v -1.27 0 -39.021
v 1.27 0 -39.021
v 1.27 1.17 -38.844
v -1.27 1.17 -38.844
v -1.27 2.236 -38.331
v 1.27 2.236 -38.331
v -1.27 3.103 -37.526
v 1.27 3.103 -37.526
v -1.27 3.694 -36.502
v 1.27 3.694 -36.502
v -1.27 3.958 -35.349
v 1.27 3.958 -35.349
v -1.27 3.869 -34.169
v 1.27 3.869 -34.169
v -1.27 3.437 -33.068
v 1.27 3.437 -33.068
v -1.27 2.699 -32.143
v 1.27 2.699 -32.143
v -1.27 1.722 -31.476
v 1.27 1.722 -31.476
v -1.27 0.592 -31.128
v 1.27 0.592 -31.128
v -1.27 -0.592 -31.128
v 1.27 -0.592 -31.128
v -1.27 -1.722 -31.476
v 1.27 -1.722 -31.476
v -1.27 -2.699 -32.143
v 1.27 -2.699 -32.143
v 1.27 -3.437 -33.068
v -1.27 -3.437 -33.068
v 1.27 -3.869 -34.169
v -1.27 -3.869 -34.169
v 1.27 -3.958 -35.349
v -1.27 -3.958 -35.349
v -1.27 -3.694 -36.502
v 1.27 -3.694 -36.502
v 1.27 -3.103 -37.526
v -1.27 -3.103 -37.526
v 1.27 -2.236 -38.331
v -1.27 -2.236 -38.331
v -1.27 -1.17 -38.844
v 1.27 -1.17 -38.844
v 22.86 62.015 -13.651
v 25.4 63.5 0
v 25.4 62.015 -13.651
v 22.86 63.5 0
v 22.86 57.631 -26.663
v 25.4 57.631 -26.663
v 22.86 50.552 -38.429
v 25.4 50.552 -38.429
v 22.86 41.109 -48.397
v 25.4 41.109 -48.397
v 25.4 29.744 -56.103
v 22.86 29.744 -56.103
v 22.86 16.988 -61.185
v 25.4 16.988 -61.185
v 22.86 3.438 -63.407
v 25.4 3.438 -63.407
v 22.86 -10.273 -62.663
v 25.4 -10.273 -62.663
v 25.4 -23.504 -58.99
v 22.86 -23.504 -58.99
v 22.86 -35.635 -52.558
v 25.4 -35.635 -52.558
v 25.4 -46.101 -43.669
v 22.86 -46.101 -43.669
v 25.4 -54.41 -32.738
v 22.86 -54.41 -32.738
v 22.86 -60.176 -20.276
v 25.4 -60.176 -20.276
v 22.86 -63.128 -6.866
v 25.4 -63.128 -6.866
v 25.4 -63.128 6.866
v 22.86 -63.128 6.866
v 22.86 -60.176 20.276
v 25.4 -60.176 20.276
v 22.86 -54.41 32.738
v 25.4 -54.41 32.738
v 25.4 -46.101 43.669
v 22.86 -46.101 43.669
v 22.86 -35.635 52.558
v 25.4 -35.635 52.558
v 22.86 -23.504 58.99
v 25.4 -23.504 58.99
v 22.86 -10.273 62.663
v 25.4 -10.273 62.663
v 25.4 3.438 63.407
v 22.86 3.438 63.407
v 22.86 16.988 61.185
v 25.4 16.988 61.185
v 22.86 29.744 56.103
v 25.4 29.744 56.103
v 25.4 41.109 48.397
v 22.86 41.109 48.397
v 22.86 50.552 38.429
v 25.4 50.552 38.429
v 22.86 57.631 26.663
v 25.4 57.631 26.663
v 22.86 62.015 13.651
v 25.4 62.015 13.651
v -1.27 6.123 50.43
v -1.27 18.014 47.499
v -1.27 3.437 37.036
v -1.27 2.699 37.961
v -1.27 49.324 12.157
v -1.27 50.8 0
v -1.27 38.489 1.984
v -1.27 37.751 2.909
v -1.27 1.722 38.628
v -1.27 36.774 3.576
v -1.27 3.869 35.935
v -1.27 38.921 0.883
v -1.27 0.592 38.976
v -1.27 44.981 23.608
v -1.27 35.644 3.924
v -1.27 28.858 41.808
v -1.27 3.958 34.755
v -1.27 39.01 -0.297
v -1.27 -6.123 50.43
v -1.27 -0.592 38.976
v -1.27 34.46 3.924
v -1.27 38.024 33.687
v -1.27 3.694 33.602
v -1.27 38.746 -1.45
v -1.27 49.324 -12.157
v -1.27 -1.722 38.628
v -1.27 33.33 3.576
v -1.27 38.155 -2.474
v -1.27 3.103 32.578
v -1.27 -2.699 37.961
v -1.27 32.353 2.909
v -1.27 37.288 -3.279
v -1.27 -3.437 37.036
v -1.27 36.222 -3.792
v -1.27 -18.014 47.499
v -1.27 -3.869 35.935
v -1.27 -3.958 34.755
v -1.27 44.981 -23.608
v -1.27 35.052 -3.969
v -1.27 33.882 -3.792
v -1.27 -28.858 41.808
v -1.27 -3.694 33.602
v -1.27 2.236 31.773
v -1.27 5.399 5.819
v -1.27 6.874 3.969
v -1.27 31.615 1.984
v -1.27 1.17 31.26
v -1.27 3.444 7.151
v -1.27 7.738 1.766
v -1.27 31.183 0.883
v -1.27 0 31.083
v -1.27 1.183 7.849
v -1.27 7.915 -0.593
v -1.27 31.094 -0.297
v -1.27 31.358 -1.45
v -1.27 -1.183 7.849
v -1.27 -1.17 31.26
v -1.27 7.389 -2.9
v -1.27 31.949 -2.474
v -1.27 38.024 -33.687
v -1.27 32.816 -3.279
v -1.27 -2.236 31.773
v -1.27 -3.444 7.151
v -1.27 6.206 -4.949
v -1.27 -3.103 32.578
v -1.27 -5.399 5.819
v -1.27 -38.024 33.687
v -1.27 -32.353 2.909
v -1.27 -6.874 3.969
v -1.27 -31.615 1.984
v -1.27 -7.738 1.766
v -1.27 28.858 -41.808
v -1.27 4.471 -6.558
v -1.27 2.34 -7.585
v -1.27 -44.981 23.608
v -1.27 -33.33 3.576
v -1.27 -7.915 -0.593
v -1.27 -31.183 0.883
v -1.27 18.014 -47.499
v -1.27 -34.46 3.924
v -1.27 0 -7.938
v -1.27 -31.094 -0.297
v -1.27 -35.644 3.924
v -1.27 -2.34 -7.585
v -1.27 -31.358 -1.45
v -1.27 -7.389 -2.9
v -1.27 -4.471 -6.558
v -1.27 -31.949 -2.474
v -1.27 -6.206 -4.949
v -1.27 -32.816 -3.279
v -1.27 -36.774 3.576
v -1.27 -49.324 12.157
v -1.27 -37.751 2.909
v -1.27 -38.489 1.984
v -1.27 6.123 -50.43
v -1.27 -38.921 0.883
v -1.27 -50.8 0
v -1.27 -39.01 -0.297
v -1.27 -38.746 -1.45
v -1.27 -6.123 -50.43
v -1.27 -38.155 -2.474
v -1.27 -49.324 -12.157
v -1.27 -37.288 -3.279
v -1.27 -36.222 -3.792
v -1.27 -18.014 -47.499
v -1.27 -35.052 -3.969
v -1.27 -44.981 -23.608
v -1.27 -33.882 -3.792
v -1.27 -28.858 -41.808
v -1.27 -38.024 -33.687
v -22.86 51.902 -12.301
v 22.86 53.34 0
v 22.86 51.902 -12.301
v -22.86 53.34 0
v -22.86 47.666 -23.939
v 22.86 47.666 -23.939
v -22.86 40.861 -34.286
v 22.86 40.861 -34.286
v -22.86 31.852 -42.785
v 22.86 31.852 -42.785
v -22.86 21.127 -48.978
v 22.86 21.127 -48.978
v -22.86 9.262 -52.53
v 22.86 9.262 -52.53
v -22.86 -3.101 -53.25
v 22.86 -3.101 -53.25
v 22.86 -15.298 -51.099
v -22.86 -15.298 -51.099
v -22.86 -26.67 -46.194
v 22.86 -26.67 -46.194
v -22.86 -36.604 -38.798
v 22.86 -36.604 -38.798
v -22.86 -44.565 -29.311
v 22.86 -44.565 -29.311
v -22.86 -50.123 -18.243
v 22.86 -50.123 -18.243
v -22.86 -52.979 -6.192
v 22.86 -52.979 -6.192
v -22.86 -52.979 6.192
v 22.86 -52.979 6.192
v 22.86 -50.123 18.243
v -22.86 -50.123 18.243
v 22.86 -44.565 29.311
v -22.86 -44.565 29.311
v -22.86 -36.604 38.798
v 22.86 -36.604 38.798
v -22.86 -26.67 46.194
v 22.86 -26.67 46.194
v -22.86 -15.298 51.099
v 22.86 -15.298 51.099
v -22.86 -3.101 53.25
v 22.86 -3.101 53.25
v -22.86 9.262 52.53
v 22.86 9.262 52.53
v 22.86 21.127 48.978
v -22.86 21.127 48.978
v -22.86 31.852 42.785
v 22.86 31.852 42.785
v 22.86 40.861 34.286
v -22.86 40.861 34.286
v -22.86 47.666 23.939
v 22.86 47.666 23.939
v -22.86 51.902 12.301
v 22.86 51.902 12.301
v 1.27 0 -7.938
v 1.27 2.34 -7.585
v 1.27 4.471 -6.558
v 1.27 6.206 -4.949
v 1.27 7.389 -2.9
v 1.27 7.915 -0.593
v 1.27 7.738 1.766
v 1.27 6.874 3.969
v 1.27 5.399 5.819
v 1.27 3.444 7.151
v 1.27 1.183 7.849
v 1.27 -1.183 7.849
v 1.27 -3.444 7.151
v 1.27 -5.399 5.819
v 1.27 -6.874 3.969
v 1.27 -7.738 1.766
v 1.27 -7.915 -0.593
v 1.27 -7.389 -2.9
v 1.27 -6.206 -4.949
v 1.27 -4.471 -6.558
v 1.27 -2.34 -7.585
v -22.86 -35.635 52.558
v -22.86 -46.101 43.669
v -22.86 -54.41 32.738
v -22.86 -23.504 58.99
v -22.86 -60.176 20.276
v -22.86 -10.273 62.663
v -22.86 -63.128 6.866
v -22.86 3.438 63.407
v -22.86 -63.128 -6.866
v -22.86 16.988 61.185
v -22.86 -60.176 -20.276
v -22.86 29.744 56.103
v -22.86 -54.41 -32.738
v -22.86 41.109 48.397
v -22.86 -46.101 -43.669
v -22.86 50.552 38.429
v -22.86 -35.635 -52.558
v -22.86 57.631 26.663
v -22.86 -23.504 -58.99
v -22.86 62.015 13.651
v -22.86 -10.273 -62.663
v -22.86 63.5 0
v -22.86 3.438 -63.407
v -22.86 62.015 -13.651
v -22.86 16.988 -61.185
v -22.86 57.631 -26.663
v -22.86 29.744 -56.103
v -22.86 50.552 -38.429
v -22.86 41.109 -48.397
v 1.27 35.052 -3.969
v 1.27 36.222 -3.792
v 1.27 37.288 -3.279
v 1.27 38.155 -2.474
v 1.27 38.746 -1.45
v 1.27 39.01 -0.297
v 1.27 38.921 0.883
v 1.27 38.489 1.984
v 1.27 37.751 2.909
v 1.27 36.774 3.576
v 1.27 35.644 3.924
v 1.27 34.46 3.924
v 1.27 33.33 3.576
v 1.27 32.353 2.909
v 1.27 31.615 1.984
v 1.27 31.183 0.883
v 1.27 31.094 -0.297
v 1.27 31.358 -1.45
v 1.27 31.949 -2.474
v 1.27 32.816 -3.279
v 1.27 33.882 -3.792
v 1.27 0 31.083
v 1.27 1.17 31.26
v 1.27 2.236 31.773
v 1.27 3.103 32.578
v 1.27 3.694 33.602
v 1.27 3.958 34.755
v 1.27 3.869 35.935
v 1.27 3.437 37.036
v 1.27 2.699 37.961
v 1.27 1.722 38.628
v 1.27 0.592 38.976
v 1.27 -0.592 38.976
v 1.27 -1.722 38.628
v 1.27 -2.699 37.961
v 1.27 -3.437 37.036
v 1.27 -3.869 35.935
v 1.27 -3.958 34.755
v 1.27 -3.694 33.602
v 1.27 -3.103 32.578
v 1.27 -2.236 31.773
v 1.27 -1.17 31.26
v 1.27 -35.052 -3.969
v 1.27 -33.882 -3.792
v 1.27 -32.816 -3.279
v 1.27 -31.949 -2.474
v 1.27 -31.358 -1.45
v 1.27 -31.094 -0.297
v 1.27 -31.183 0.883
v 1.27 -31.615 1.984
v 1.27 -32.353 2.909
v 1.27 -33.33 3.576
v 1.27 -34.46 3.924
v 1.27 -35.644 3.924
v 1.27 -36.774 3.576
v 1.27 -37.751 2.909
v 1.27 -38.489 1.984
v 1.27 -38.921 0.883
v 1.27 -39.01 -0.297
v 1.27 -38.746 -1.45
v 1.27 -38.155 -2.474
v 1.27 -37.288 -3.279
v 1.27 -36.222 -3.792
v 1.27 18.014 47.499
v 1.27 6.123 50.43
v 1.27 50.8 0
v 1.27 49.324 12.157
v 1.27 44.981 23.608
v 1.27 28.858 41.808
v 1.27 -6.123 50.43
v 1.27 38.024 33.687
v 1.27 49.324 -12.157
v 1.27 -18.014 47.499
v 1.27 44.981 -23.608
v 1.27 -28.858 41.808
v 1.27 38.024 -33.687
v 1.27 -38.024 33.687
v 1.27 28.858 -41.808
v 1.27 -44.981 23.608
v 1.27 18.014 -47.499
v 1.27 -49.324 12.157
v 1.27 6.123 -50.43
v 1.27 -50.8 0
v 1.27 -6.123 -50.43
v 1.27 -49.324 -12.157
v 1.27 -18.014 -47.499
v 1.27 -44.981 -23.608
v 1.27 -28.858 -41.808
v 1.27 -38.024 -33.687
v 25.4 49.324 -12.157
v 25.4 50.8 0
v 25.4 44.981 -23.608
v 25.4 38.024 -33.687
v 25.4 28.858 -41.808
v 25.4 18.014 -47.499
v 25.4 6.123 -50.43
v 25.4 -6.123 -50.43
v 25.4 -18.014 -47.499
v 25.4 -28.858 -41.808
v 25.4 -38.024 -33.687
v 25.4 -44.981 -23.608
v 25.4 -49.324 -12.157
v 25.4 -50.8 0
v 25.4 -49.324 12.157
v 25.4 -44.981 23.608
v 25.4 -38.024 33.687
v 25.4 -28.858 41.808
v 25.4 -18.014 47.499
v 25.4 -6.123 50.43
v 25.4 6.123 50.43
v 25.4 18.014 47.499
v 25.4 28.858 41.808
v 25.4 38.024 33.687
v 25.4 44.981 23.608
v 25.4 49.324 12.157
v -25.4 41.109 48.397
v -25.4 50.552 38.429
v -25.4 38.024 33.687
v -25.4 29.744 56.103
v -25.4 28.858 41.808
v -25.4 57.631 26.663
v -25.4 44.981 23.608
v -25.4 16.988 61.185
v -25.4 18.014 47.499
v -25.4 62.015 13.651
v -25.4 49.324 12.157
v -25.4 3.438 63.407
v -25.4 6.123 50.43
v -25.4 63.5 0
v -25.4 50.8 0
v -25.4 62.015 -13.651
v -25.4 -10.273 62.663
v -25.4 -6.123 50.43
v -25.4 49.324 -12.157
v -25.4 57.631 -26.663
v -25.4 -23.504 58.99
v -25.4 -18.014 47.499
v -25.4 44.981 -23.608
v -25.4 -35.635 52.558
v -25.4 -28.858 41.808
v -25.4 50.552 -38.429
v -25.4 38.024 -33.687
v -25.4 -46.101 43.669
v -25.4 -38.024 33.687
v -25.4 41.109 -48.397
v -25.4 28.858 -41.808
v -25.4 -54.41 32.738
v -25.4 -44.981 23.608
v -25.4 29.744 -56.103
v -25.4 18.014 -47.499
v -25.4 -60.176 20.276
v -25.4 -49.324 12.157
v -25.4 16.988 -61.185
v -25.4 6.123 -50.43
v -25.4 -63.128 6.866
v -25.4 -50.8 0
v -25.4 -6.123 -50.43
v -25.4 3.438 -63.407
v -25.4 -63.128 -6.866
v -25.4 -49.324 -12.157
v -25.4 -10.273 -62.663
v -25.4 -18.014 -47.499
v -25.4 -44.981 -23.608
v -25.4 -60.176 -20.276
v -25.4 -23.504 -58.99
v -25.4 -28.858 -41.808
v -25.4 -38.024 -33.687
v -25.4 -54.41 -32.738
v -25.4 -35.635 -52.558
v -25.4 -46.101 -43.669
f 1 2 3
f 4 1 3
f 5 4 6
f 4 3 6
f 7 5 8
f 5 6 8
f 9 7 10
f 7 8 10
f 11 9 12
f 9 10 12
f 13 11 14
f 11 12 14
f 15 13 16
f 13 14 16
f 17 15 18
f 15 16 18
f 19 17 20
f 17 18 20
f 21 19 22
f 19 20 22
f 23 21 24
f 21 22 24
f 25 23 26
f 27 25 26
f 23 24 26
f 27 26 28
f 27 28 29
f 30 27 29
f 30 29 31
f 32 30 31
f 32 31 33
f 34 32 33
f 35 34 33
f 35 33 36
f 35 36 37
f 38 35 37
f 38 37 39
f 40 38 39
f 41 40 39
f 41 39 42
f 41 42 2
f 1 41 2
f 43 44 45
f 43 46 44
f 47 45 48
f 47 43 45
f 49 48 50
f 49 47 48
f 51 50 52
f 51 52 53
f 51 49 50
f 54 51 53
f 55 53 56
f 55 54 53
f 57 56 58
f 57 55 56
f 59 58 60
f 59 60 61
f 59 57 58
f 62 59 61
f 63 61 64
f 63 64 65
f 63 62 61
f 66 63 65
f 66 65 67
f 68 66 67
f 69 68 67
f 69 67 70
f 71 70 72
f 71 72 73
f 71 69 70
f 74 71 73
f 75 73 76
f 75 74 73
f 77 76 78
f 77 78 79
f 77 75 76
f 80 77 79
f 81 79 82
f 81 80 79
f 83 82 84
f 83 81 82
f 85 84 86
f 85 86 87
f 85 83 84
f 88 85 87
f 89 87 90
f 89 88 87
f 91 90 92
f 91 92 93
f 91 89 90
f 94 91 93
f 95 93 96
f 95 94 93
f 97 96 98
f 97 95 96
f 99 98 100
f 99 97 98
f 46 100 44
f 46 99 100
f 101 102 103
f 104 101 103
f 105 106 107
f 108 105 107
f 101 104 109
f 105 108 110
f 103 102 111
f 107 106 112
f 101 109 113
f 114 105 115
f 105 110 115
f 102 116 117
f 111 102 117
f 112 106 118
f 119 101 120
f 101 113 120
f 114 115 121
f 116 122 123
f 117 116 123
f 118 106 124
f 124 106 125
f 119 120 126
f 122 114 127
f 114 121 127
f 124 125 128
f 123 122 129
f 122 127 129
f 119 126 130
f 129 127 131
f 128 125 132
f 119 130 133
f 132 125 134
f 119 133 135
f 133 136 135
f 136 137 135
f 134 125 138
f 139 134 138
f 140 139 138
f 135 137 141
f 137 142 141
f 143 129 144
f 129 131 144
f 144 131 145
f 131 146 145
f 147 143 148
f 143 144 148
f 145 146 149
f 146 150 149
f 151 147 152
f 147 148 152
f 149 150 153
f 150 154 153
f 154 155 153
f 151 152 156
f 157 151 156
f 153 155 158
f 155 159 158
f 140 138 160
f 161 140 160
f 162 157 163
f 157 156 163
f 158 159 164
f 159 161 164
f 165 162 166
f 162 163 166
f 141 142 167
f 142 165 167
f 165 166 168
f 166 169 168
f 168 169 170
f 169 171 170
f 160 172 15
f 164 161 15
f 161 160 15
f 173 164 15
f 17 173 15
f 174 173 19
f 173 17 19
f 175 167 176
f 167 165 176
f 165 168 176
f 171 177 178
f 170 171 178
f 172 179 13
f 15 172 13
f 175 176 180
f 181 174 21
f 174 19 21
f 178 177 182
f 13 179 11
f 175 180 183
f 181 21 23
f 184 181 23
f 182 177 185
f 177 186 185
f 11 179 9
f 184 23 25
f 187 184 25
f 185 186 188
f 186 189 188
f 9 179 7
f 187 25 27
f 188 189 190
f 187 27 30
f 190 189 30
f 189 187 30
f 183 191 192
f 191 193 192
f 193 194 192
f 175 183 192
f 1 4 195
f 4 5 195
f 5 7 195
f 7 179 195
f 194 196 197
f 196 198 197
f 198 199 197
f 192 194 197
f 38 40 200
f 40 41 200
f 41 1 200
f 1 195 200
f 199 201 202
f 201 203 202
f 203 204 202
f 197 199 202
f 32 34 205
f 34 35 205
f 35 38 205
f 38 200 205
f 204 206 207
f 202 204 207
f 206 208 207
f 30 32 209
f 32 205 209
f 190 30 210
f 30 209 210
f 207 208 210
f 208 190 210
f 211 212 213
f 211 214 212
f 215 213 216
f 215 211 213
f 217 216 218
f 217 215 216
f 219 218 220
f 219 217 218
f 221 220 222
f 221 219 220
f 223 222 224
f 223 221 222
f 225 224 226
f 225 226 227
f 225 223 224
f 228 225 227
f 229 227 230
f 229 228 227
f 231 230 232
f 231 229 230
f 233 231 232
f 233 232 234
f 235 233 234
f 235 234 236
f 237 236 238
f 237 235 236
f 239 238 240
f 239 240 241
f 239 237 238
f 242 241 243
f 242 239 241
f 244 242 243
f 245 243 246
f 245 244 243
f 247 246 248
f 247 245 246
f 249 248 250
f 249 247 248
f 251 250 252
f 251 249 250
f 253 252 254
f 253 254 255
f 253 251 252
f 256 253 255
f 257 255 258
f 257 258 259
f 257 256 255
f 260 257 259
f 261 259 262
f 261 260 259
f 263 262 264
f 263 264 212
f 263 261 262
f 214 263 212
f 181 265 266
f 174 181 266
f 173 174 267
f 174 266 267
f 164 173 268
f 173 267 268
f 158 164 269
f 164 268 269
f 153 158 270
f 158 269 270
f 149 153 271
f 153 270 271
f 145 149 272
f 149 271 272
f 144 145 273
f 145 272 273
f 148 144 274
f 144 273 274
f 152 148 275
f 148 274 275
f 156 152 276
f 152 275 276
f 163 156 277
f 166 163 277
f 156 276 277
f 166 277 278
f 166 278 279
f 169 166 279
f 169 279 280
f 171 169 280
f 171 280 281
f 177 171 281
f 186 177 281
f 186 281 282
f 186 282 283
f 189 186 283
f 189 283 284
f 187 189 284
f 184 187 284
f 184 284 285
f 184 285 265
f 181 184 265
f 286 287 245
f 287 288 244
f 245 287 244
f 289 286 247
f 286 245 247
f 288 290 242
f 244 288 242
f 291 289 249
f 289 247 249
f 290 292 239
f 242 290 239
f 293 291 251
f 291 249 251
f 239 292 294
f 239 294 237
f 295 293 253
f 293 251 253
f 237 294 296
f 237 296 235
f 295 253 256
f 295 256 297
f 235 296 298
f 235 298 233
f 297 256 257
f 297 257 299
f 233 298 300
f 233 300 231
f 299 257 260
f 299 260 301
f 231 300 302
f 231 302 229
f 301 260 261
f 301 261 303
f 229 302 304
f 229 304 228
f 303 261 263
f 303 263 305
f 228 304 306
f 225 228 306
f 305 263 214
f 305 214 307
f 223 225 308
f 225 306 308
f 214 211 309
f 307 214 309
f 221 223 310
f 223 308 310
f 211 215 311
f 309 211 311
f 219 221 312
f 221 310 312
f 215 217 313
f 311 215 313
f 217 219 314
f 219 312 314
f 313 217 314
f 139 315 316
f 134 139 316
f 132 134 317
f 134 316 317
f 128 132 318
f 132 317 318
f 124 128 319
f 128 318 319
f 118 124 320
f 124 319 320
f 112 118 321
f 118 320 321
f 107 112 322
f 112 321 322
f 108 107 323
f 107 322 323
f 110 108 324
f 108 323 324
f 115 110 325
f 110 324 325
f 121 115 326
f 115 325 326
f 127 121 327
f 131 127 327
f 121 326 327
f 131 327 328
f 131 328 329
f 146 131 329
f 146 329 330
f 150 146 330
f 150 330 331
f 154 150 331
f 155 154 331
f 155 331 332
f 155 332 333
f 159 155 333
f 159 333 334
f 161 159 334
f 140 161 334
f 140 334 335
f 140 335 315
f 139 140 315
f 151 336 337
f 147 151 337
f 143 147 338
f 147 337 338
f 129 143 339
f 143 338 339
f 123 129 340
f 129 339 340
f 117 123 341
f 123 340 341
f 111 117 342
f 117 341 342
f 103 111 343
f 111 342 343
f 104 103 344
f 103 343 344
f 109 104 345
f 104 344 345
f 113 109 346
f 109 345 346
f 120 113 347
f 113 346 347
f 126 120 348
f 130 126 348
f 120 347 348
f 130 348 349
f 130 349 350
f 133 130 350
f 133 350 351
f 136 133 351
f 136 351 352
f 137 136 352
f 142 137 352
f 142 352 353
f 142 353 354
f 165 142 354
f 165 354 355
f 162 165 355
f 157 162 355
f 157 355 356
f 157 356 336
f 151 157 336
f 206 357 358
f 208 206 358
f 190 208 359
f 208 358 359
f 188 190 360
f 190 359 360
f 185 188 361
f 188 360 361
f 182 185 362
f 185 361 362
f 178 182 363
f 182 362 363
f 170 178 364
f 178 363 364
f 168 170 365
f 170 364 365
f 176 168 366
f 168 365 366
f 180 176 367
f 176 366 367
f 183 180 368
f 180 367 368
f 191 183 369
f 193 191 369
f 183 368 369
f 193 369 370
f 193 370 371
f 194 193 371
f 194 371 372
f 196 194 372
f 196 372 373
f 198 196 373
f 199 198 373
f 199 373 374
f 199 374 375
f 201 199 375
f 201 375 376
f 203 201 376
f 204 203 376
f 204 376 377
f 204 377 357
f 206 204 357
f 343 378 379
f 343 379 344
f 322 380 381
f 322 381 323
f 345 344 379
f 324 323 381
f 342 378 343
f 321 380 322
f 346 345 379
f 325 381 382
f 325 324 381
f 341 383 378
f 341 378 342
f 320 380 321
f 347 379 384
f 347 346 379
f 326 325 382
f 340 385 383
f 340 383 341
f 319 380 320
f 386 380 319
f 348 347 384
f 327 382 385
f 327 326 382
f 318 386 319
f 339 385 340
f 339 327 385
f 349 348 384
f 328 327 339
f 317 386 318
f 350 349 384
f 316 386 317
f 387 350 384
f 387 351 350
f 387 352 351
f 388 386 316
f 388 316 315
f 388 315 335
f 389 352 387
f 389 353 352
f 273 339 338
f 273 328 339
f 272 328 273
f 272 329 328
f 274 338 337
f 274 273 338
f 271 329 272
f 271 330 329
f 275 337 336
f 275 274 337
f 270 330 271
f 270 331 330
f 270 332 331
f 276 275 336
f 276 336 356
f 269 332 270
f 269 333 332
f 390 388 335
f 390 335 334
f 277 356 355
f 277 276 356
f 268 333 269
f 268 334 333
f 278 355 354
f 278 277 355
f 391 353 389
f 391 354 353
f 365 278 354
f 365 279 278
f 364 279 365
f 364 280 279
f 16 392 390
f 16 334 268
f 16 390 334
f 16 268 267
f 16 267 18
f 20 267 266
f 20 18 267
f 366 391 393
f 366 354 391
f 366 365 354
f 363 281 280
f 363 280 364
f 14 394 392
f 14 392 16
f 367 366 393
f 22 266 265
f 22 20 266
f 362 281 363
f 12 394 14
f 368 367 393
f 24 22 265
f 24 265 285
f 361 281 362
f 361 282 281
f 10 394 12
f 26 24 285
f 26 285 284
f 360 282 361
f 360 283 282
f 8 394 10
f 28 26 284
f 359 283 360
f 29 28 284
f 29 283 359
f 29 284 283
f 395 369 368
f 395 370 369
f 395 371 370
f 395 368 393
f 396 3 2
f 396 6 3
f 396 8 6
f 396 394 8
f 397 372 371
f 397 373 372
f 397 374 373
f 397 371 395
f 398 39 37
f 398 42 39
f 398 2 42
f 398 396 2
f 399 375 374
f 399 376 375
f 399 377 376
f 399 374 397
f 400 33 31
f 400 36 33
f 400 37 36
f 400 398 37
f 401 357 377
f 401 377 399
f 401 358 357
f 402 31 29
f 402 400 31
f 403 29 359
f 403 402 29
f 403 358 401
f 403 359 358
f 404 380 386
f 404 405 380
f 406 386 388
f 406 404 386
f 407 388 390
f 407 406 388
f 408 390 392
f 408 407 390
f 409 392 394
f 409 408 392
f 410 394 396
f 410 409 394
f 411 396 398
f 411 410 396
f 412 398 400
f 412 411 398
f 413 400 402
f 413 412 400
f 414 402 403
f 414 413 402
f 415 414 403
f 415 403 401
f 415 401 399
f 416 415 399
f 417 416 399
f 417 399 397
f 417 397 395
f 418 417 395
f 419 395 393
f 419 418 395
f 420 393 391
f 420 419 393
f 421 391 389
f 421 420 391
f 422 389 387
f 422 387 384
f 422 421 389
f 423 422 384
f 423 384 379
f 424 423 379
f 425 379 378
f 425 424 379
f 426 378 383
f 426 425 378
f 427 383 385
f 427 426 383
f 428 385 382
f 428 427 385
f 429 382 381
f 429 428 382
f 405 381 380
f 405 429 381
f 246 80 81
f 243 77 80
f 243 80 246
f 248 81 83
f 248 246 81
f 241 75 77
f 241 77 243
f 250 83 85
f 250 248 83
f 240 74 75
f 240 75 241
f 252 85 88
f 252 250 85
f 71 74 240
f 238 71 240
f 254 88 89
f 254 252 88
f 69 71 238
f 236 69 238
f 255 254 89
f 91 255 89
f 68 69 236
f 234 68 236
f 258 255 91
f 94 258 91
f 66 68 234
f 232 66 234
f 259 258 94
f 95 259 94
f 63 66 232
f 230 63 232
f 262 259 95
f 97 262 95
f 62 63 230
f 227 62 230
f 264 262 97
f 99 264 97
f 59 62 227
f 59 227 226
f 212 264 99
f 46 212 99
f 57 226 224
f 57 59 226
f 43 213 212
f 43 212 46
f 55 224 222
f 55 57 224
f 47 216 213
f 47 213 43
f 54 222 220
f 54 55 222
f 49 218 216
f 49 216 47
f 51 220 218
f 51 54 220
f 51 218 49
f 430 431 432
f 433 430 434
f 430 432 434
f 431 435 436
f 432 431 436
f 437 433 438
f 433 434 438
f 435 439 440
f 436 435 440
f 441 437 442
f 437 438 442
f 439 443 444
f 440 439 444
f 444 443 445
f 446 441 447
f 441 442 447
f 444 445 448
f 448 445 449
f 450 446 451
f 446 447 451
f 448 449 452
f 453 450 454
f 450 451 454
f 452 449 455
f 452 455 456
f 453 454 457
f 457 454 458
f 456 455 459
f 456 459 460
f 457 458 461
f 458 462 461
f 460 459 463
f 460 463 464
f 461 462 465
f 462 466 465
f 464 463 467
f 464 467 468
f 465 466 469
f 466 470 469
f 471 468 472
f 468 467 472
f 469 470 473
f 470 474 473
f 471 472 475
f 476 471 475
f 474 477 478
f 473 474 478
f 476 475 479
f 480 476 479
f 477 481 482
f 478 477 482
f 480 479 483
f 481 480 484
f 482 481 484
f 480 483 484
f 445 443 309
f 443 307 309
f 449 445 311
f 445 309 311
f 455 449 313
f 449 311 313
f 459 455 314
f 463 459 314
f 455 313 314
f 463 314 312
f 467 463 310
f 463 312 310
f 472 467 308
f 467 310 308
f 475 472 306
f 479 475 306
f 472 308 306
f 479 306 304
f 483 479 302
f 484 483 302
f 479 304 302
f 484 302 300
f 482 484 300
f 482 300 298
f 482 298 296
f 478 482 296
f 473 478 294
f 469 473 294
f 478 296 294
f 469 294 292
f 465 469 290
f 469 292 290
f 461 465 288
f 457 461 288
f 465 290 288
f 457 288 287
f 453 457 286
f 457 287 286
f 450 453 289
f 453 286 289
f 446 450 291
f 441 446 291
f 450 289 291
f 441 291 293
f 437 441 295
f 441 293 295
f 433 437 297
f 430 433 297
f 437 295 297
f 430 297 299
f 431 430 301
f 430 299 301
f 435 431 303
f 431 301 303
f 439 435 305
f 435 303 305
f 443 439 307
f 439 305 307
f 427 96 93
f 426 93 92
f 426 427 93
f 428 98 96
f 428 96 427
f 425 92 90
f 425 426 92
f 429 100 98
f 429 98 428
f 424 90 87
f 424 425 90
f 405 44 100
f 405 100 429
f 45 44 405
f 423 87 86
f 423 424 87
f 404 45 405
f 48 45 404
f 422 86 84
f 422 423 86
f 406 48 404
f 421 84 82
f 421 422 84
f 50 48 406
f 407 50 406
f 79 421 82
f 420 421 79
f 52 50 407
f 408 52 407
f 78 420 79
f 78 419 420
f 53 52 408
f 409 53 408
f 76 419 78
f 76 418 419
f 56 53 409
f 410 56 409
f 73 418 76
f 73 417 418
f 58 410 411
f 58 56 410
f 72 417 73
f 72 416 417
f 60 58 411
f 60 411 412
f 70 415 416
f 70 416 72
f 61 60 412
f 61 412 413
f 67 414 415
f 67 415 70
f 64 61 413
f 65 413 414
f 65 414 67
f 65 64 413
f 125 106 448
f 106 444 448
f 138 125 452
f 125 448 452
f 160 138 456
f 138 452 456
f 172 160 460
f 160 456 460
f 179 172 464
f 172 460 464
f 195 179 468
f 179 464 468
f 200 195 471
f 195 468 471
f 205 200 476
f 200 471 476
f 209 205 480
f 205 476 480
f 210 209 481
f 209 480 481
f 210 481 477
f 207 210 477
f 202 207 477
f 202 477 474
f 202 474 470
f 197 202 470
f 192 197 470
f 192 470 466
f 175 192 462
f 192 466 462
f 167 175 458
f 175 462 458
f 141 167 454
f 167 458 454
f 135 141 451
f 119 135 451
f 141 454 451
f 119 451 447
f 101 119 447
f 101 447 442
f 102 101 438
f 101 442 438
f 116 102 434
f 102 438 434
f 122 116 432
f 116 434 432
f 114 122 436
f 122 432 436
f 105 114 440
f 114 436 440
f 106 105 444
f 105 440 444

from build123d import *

# Parameters (mm, degrees)
CUT_EXTRUDE1_REACH = 28.67
SKETCH2_R          = 3.96875
SKETCH2_R_2        = 7.9375


with BuildPart() as part:
    # Sketch1 → Revolve1 (revolve)
    with BuildSketch(Plane.XY):
        Polygon((0, 0), (-1.27, 0), (-1.27, 50.8), (-25.4, 50.8), (-25.4, 63.5), (-22.86, 63.5), (-22.86, 53.34), (0, 53.34), (0, 50.8), align=None)
    revolve1 = revolve(axis=Axis((0, 0, 0), (-1, 0, 0)))

    # Mirror1: Revolve1 across plane
    add(revolve1.mirror(Plane(origin=(0, 0, 0), x_dir=(0, 0, 1), z_dir=(1, 0, 0))))

    # Sketch2 → Cut-Extrude1 (cut, up to next)
    with BuildSketch(Plane(origin=(1.27, 0, 0), x_dir=(0, 0, -1), z_dir=(1, 0, 0)), mode=Mode.PRIVATE) as cut_extrude1_sk1:
        with Locations((35.052, 0)):
            Circle(SKETCH2_R)
    cut_extrude1_tool1 = extrude(cut_extrude1_sk1.sketch, amount=-CUT_EXTRUDE1_REACH, mode=Mode.PRIVATE) & part.part
    add(cut_extrude1_tool1.solids().sort_by_distance((1.27, 0, -35.052))[0], mode=Mode.SUBTRACT)
    # Sketch2 → Cut-Extrude1 (cut, up to next)
    with BuildSketch(Plane(origin=(1.27, 0, 0), x_dir=(0, 0, -1), z_dir=(1, 0, 0)), mode=Mode.PRIVATE) as cut_extrude1_sk2:
        with Locations((0, 35.052)):
            Circle(SKETCH2_R)
    cut_extrude1_tool2 = extrude(cut_extrude1_sk2.sketch, amount=-CUT_EXTRUDE1_REACH, mode=Mode.PRIVATE) & part.part
    add(cut_extrude1_tool2.solids().sort_by_distance((1.27, 35.052, 0))[0], mode=Mode.SUBTRACT)
    # Sketch2 → Cut-Extrude1 (cut, up to next)
    with BuildSketch(Plane(origin=(1.27, 0, 0), x_dir=(0, 0, -1), z_dir=(1, 0, 0)), mode=Mode.PRIVATE) as cut_extrude1_sk3:
        with Locations((0, -35.052)):
            Circle(SKETCH2_R)
    cut_extrude1_tool3 = extrude(cut_extrude1_sk3.sketch, amount=-CUT_EXTRUDE1_REACH, mode=Mode.PRIVATE) & part.part
    add(cut_extrude1_tool3.solids().sort_by_distance((1.27, -35.052, 0))[0], mode=Mode.SUBTRACT)
    # Sketch2 → Cut-Extrude1 (cut, up to next)
    with BuildSketch(Plane(origin=(1.27, 0, 0), x_dir=(0, 0, -1), z_dir=(1, 0, 0)), mode=Mode.PRIVATE) as cut_extrude1_sk4:
        with Locations((-35.052, 0)):
            Circle(SKETCH2_R)
    cut_extrude1_tool4 = extrude(cut_extrude1_sk4.sketch, amount=-CUT_EXTRUDE1_REACH, mode=Mode.PRIVATE) & part.part
    add(cut_extrude1_tool4.solids().sort_by_distance((1.27, 0, 35.052))[0], mode=Mode.SUBTRACT)
    # Sketch2 → Cut-Extrude1 (cut, up to next)
    with BuildSketch(Plane(origin=(1.27, 0, 0), x_dir=(0, 0, -1), z_dir=(1, 0, 0)), mode=Mode.PRIVATE) as cut_extrude1_sk5:
        Circle(SKETCH2_R_2)
    cut_extrude1_tool5 = extrude(cut_extrude1_sk5.sketch, amount=-CUT_EXTRUDE1_REACH, mode=Mode.PRIVATE) & part.part
    add(cut_extrude1_tool5.solids().sort_by_distance((1.27, 0, 0))[0], mode=Mode.SUBTRACT)


solid = part.part
